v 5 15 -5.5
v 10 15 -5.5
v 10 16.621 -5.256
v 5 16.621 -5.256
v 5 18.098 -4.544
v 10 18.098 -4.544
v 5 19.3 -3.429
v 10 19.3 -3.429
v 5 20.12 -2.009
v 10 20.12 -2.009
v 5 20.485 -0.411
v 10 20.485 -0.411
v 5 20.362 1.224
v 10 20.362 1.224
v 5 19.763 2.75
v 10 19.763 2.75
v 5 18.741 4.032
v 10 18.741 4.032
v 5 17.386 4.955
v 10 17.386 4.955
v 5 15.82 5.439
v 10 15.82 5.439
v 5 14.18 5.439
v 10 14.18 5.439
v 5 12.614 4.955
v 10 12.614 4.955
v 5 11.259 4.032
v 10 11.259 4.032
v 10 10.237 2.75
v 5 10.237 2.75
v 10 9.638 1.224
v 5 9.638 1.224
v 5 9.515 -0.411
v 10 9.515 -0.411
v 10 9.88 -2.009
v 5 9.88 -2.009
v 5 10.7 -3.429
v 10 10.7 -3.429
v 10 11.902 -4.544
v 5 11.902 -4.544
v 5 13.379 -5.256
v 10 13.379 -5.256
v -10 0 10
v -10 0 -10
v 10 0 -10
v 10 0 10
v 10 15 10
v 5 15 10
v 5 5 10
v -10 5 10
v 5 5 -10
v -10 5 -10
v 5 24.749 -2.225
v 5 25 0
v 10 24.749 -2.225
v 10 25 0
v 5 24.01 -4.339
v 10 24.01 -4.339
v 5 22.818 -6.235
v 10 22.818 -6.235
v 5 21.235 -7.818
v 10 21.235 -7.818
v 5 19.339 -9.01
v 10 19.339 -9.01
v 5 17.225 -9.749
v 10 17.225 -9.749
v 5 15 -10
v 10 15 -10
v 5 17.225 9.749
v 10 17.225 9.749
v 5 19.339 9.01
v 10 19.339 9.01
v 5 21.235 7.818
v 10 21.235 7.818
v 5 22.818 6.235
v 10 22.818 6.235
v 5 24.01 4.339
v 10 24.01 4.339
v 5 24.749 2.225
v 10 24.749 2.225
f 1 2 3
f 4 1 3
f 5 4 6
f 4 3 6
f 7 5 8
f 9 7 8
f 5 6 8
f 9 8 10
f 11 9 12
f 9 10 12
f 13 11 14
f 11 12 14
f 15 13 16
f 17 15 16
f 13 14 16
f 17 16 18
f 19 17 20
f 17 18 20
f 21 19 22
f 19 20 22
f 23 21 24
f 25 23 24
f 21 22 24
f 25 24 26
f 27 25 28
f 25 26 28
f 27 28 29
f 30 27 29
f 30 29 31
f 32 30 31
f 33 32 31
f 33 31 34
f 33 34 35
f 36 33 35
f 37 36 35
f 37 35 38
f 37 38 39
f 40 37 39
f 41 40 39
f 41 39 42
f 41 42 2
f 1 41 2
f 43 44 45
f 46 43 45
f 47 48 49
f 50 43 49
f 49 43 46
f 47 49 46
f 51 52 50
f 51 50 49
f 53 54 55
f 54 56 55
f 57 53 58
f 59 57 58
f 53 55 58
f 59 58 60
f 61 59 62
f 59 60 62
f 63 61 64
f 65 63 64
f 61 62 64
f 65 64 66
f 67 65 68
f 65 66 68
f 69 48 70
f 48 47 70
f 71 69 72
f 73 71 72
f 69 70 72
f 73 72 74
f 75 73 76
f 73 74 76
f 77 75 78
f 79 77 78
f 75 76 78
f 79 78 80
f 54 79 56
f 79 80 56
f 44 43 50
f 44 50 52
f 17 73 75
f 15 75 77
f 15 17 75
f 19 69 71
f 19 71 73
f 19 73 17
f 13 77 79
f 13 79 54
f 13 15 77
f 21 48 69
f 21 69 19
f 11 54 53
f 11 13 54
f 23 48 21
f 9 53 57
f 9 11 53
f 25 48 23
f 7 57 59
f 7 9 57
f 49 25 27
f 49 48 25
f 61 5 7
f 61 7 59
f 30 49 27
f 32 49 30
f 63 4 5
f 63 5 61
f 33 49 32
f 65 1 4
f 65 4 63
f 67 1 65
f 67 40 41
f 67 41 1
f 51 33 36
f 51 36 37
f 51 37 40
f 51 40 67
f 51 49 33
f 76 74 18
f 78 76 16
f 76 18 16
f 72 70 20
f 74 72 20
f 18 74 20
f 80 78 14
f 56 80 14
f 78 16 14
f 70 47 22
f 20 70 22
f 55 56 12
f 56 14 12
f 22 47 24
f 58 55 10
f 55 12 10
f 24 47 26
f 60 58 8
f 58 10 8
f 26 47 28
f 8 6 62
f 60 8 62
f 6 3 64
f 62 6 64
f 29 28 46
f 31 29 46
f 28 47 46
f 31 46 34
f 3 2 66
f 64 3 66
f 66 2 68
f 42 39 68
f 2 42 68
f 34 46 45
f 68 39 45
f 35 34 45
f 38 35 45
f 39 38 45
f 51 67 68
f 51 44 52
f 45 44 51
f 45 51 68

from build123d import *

# Parameters (mm, degrees)
SKETCH1_W           = 20
SKETCH1_H           = 20
BOSS_EXTRUDE1_DEPTH = 5
SKETCH2_W           = 5
SKETCH2_H           = 20
BOSS_EXTRUDE2_DEPTH = 20
SKETCH3_R           = 5.5
CUT_EXTRUDE1_DEPTH  = 34.541019662
FILLET1_R           = 10


with BuildPart() as part:
    # Sketch1 → Boss-Extrude1 (new body)
    with BuildSketch(Plane(origin=(0, 0, 0), x_dir=(1, 0, 0), z_dir=(0, 1, 0))):
        Rectangle(SKETCH1_W, SKETCH1_H)
    extrude(amount=BOSS_EXTRUDE1_DEPTH)

    # Sketch2 → Boss-Extrude2 (add)
    with BuildSketch(Plane(origin=(0, 5, 0), x_dir=(1, 0, 0), z_dir=(0, 1, 0))):
        with Locations((7.5, 0)):
            Rectangle(SKETCH2_W, SKETCH2_H)
    extrude(amount=BOSS_EXTRUDE2_DEPTH)

    # Sketch3 → Cut-Extrude1 (cut, through all)
    with BuildSketch(Plane(origin=(10, 0, 0), x_dir=(0, 0, -1), z_dir=(1, 0, 0))):
        with Locations((0, 15)):
            Circle(SKETCH3_R)
    extrude(amount=-CUT_EXTRUDE1_DEPTH, mode=Mode.SUBTRACT)

    # Fillet1
    fillet1_edges = [part.edges().sort_by_distance(p)[0] for p in [
        (7.5, 25, -10),
        (7.5, 25, 10),
    ]]
    fillet(fillet1_edges, radius=FILLET1_R - 0.0001)  # a hair under: the kernel refuses the full size


solid = part.part
